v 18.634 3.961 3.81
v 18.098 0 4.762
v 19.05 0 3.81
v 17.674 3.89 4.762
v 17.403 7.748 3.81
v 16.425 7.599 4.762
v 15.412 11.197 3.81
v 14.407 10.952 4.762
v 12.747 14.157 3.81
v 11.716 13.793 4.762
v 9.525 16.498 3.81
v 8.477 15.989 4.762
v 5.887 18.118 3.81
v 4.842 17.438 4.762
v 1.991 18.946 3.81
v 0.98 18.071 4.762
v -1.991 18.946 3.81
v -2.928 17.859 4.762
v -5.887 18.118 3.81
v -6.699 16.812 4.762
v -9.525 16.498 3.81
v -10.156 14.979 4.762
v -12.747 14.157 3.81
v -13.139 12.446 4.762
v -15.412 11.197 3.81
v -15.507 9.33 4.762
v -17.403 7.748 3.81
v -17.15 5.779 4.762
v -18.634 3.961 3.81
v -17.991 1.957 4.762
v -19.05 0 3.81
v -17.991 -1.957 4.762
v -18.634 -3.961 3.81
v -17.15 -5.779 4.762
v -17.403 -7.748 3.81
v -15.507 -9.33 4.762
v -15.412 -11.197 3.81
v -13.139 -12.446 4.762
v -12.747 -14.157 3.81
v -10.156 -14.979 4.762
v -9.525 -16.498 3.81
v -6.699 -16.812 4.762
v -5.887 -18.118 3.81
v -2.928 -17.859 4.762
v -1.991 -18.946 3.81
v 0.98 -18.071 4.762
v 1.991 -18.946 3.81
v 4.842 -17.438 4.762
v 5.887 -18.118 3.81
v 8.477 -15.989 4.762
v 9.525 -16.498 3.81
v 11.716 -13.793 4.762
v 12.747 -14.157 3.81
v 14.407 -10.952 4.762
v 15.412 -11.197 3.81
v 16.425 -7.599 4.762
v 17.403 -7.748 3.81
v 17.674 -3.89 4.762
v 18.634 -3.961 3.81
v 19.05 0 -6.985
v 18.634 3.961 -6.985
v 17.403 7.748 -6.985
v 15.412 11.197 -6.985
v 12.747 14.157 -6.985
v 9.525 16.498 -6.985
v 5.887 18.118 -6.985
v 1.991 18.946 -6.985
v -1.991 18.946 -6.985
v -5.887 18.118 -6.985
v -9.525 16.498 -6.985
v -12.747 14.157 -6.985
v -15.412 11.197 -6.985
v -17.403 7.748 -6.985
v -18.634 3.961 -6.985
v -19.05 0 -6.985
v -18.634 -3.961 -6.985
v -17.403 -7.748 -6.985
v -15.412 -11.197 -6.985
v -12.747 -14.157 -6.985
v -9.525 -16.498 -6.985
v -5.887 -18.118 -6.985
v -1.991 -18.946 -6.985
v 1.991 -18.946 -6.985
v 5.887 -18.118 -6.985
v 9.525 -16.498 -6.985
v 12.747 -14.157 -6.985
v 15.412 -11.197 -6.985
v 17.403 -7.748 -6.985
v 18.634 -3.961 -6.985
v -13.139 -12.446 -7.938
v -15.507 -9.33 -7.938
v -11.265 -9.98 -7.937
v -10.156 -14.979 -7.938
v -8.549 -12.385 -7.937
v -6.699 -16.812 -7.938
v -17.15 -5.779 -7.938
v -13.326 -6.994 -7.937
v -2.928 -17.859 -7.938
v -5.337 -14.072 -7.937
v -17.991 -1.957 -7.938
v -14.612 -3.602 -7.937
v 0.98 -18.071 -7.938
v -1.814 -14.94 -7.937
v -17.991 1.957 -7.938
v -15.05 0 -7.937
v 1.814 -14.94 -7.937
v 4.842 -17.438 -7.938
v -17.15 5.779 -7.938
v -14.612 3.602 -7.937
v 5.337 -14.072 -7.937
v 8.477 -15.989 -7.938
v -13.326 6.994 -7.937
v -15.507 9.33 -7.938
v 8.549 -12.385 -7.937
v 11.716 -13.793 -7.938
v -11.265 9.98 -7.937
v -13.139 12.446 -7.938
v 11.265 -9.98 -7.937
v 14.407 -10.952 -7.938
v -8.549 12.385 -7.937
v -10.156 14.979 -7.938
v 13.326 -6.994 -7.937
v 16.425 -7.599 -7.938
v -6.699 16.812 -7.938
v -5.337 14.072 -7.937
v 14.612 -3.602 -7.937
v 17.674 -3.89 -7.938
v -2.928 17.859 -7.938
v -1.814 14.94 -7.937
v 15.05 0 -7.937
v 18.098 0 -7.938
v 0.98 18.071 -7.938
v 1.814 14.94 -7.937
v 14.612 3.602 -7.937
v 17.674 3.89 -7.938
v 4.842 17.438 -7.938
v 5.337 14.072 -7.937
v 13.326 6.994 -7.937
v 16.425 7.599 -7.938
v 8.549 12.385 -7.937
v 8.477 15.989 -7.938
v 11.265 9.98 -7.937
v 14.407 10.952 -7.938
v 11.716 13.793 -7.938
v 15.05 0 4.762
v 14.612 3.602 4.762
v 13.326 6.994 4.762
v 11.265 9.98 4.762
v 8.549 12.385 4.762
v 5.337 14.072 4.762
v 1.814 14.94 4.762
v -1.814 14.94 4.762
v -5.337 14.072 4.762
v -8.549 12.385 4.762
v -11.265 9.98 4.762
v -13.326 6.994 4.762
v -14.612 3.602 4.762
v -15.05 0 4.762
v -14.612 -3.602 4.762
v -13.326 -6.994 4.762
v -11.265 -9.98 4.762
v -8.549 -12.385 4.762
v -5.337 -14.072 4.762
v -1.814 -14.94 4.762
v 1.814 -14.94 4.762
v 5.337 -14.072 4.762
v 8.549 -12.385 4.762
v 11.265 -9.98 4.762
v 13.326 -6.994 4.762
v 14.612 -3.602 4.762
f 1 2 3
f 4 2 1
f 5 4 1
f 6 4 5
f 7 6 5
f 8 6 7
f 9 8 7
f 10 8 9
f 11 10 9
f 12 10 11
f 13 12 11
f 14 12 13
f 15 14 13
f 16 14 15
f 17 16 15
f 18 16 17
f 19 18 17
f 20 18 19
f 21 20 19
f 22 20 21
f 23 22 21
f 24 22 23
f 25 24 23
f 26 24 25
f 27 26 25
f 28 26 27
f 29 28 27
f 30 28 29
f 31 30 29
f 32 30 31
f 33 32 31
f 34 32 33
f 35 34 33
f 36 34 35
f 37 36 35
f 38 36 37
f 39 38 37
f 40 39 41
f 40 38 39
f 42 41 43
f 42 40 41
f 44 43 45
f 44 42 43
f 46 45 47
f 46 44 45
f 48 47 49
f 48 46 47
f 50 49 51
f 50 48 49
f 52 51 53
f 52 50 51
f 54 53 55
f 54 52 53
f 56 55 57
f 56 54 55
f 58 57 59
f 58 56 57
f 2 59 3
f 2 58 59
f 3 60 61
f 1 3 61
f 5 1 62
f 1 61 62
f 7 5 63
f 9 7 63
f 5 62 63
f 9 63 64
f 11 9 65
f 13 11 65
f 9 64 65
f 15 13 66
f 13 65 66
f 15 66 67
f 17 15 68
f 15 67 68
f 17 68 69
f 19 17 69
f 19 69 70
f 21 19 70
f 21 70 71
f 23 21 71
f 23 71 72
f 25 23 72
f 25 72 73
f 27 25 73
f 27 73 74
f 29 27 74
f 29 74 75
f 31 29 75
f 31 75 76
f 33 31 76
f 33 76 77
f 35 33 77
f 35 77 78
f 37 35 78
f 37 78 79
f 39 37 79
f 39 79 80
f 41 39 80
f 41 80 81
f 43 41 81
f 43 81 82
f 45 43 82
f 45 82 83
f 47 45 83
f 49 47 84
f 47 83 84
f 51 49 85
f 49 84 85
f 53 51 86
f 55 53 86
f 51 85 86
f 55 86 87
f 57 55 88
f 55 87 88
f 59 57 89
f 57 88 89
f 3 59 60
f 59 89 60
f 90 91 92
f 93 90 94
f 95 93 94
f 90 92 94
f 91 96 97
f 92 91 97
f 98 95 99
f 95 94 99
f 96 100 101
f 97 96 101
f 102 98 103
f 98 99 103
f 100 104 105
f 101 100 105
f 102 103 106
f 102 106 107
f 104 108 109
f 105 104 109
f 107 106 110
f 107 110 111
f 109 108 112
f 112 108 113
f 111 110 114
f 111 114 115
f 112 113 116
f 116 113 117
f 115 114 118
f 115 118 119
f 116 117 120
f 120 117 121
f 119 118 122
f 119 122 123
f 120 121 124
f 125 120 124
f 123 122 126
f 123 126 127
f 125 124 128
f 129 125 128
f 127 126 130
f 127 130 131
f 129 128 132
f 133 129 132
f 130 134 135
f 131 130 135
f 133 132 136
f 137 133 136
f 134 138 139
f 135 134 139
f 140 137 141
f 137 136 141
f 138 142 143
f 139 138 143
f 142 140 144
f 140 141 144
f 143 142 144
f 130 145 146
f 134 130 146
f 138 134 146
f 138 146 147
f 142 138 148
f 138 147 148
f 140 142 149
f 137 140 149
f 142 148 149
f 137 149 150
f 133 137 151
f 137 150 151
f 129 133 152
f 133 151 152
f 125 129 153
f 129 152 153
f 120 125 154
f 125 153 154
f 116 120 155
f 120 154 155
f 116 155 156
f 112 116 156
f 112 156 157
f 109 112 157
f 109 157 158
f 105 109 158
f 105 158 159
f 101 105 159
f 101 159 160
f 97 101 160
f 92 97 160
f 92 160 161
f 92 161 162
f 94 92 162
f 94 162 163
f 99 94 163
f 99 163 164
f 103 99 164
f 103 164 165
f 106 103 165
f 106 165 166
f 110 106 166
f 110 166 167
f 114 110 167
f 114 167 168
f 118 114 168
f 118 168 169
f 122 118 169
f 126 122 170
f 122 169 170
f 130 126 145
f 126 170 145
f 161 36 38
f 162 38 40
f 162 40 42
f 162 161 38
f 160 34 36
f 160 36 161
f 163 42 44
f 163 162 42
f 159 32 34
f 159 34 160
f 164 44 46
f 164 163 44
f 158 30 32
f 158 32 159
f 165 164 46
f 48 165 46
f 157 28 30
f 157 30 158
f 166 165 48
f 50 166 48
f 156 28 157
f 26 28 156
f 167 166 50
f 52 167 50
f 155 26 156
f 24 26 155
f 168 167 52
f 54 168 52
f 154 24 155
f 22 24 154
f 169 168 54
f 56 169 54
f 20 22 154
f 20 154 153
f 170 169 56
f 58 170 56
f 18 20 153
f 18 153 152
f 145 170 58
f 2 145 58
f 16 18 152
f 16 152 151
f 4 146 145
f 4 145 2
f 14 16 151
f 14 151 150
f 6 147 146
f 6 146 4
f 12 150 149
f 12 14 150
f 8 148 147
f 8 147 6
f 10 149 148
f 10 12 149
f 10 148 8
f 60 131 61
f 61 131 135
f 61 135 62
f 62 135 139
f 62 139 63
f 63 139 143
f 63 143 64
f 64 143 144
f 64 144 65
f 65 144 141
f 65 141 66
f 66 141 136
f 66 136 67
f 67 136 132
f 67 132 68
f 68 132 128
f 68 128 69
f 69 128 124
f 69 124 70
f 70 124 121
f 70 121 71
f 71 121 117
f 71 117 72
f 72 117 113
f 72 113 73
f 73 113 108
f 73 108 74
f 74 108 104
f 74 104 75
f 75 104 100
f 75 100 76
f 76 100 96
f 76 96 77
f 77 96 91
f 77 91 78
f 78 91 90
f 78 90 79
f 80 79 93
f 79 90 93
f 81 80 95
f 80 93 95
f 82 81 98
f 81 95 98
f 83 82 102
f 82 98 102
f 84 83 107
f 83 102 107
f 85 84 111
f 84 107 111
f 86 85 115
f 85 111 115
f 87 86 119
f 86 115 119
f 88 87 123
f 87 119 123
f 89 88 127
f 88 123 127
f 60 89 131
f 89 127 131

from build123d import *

# Parameters (mm, degrees)
BOSS_EXTRUDE1_DEPTH      = 7.9375
BOSS_EXTRUDE1_DEPTH_BACK = 7.9375
SKETCH3_R                = 19.05
SKETCH3_R_2              = 9.525
CHAMFER1_SIZE            = 0.9525
SKETCH4_R                = 19.05
CUT_EXTRUDE1_DEPTH       = 3.175
SKETCH5_R                = 15.0495
CUT_EXTRUDE2_DEPTH       = 30.784140075
CHAMFER2_SIZE            = 0.9525


with BuildPart() as part:
    # Sketch3 → Boss-Extrude1 (new, two sides: drawn at the far end of the back side and taken through both)
    with BuildSketch(Plane.XY.offset(-BOSS_EXTRUDE1_DEPTH_BACK)):
        Circle(SKETCH3_R)
        Circle(SKETCH3_R_2, mode=Mode.SUBTRACT)
    extrude(amount=BOSS_EXTRUDE1_DEPTH + BOSS_EXTRUDE1_DEPTH_BACK)

    # Chamfer1
    chamfer1_edges = [part.edges().sort_by_distance(p)[0] for p in [
        (-19.05, 0, -7.9375),
        (-9.525, 0, -7.9375),
        (-19.05, 0, 7.9375),
        (-9.525, 0, 7.9375),
    ]]
    chamfer(chamfer1_edges, length=CHAMFER1_SIZE)

    # Sketch4 → Cut-Extrude1 (cut)
    with BuildSketch(Plane.XY.offset(7.9375)):
        Circle(SKETCH4_R)
    extrude(amount=-CUT_EXTRUDE1_DEPTH, mode=Mode.SUBTRACT)

    # Sketch5 → Cut-Extrude2 (cut, through all)
    with BuildSketch(Plane.XY.offset(4.7625)):
        Circle(SKETCH5_R)
    extrude(amount=-CUT_EXTRUDE2_DEPTH, mode=Mode.SUBTRACT)

    # Chamfer2
    chamfer2_edges = [part.edges().sort_by_distance(p)[0] for p in [
        (-19.05, 0, 4.7625),
    ]]
    chamfer(chamfer2_edges, length=CHAMFER2_SIZE)


solid = part.part
